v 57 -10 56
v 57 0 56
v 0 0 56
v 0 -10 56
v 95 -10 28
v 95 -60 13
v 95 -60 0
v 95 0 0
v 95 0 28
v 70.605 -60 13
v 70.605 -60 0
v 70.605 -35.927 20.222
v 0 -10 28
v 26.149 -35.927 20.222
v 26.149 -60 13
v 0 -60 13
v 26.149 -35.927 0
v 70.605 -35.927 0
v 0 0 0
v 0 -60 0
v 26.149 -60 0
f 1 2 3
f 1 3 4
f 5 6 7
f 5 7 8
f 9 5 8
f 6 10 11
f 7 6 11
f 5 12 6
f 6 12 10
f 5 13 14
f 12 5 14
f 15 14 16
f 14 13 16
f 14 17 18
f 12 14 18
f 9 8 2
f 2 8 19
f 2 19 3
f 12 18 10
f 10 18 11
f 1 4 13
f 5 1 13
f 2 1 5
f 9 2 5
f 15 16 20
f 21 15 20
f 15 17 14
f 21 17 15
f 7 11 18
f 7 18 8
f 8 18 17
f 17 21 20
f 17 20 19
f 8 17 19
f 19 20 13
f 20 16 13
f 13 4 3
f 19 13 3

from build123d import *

# Parameters (mm, degrees)
F1_DEPTH = 95
F3_DEPTH = 10.001
F4_W     = 44.455645
F4_H     = 24.072581
F5_DEPTH = 61.3


with BuildPart() as f1:
    # F0 (on Right) → F1 (new body)
    with BuildSketch(Plane.YZ):
        Polygon((-60, 0), (0, 0), (0, 56), (-10, 56), (-10, 28), (-60, 13), align=None)
    extrude(amount=F1_DEPTH)

    # F2 (on face) → F3 (cut, through all)
    with BuildSketch(Plane.XZ.offset(10)):
        Polygon((95, 56), (57, 56), (95, 28), align=None)
    extrude(amount=-F3_DEPTH, mode=Mode.SUBTRACT)

    # F4 (on face) → F5 (cut)
    with BuildSketch(Plane(origin=(0, 0, 0), x_dir=(1, 0, 0), z_dir=(0, 0, -1))):
        with Locations((48.377015, 47.96371)):
            Rectangle(F4_W, F4_H)
    extrude(amount=-F5_DEPTH, mode=Mode.SUBTRACT)


solid = f1.part
